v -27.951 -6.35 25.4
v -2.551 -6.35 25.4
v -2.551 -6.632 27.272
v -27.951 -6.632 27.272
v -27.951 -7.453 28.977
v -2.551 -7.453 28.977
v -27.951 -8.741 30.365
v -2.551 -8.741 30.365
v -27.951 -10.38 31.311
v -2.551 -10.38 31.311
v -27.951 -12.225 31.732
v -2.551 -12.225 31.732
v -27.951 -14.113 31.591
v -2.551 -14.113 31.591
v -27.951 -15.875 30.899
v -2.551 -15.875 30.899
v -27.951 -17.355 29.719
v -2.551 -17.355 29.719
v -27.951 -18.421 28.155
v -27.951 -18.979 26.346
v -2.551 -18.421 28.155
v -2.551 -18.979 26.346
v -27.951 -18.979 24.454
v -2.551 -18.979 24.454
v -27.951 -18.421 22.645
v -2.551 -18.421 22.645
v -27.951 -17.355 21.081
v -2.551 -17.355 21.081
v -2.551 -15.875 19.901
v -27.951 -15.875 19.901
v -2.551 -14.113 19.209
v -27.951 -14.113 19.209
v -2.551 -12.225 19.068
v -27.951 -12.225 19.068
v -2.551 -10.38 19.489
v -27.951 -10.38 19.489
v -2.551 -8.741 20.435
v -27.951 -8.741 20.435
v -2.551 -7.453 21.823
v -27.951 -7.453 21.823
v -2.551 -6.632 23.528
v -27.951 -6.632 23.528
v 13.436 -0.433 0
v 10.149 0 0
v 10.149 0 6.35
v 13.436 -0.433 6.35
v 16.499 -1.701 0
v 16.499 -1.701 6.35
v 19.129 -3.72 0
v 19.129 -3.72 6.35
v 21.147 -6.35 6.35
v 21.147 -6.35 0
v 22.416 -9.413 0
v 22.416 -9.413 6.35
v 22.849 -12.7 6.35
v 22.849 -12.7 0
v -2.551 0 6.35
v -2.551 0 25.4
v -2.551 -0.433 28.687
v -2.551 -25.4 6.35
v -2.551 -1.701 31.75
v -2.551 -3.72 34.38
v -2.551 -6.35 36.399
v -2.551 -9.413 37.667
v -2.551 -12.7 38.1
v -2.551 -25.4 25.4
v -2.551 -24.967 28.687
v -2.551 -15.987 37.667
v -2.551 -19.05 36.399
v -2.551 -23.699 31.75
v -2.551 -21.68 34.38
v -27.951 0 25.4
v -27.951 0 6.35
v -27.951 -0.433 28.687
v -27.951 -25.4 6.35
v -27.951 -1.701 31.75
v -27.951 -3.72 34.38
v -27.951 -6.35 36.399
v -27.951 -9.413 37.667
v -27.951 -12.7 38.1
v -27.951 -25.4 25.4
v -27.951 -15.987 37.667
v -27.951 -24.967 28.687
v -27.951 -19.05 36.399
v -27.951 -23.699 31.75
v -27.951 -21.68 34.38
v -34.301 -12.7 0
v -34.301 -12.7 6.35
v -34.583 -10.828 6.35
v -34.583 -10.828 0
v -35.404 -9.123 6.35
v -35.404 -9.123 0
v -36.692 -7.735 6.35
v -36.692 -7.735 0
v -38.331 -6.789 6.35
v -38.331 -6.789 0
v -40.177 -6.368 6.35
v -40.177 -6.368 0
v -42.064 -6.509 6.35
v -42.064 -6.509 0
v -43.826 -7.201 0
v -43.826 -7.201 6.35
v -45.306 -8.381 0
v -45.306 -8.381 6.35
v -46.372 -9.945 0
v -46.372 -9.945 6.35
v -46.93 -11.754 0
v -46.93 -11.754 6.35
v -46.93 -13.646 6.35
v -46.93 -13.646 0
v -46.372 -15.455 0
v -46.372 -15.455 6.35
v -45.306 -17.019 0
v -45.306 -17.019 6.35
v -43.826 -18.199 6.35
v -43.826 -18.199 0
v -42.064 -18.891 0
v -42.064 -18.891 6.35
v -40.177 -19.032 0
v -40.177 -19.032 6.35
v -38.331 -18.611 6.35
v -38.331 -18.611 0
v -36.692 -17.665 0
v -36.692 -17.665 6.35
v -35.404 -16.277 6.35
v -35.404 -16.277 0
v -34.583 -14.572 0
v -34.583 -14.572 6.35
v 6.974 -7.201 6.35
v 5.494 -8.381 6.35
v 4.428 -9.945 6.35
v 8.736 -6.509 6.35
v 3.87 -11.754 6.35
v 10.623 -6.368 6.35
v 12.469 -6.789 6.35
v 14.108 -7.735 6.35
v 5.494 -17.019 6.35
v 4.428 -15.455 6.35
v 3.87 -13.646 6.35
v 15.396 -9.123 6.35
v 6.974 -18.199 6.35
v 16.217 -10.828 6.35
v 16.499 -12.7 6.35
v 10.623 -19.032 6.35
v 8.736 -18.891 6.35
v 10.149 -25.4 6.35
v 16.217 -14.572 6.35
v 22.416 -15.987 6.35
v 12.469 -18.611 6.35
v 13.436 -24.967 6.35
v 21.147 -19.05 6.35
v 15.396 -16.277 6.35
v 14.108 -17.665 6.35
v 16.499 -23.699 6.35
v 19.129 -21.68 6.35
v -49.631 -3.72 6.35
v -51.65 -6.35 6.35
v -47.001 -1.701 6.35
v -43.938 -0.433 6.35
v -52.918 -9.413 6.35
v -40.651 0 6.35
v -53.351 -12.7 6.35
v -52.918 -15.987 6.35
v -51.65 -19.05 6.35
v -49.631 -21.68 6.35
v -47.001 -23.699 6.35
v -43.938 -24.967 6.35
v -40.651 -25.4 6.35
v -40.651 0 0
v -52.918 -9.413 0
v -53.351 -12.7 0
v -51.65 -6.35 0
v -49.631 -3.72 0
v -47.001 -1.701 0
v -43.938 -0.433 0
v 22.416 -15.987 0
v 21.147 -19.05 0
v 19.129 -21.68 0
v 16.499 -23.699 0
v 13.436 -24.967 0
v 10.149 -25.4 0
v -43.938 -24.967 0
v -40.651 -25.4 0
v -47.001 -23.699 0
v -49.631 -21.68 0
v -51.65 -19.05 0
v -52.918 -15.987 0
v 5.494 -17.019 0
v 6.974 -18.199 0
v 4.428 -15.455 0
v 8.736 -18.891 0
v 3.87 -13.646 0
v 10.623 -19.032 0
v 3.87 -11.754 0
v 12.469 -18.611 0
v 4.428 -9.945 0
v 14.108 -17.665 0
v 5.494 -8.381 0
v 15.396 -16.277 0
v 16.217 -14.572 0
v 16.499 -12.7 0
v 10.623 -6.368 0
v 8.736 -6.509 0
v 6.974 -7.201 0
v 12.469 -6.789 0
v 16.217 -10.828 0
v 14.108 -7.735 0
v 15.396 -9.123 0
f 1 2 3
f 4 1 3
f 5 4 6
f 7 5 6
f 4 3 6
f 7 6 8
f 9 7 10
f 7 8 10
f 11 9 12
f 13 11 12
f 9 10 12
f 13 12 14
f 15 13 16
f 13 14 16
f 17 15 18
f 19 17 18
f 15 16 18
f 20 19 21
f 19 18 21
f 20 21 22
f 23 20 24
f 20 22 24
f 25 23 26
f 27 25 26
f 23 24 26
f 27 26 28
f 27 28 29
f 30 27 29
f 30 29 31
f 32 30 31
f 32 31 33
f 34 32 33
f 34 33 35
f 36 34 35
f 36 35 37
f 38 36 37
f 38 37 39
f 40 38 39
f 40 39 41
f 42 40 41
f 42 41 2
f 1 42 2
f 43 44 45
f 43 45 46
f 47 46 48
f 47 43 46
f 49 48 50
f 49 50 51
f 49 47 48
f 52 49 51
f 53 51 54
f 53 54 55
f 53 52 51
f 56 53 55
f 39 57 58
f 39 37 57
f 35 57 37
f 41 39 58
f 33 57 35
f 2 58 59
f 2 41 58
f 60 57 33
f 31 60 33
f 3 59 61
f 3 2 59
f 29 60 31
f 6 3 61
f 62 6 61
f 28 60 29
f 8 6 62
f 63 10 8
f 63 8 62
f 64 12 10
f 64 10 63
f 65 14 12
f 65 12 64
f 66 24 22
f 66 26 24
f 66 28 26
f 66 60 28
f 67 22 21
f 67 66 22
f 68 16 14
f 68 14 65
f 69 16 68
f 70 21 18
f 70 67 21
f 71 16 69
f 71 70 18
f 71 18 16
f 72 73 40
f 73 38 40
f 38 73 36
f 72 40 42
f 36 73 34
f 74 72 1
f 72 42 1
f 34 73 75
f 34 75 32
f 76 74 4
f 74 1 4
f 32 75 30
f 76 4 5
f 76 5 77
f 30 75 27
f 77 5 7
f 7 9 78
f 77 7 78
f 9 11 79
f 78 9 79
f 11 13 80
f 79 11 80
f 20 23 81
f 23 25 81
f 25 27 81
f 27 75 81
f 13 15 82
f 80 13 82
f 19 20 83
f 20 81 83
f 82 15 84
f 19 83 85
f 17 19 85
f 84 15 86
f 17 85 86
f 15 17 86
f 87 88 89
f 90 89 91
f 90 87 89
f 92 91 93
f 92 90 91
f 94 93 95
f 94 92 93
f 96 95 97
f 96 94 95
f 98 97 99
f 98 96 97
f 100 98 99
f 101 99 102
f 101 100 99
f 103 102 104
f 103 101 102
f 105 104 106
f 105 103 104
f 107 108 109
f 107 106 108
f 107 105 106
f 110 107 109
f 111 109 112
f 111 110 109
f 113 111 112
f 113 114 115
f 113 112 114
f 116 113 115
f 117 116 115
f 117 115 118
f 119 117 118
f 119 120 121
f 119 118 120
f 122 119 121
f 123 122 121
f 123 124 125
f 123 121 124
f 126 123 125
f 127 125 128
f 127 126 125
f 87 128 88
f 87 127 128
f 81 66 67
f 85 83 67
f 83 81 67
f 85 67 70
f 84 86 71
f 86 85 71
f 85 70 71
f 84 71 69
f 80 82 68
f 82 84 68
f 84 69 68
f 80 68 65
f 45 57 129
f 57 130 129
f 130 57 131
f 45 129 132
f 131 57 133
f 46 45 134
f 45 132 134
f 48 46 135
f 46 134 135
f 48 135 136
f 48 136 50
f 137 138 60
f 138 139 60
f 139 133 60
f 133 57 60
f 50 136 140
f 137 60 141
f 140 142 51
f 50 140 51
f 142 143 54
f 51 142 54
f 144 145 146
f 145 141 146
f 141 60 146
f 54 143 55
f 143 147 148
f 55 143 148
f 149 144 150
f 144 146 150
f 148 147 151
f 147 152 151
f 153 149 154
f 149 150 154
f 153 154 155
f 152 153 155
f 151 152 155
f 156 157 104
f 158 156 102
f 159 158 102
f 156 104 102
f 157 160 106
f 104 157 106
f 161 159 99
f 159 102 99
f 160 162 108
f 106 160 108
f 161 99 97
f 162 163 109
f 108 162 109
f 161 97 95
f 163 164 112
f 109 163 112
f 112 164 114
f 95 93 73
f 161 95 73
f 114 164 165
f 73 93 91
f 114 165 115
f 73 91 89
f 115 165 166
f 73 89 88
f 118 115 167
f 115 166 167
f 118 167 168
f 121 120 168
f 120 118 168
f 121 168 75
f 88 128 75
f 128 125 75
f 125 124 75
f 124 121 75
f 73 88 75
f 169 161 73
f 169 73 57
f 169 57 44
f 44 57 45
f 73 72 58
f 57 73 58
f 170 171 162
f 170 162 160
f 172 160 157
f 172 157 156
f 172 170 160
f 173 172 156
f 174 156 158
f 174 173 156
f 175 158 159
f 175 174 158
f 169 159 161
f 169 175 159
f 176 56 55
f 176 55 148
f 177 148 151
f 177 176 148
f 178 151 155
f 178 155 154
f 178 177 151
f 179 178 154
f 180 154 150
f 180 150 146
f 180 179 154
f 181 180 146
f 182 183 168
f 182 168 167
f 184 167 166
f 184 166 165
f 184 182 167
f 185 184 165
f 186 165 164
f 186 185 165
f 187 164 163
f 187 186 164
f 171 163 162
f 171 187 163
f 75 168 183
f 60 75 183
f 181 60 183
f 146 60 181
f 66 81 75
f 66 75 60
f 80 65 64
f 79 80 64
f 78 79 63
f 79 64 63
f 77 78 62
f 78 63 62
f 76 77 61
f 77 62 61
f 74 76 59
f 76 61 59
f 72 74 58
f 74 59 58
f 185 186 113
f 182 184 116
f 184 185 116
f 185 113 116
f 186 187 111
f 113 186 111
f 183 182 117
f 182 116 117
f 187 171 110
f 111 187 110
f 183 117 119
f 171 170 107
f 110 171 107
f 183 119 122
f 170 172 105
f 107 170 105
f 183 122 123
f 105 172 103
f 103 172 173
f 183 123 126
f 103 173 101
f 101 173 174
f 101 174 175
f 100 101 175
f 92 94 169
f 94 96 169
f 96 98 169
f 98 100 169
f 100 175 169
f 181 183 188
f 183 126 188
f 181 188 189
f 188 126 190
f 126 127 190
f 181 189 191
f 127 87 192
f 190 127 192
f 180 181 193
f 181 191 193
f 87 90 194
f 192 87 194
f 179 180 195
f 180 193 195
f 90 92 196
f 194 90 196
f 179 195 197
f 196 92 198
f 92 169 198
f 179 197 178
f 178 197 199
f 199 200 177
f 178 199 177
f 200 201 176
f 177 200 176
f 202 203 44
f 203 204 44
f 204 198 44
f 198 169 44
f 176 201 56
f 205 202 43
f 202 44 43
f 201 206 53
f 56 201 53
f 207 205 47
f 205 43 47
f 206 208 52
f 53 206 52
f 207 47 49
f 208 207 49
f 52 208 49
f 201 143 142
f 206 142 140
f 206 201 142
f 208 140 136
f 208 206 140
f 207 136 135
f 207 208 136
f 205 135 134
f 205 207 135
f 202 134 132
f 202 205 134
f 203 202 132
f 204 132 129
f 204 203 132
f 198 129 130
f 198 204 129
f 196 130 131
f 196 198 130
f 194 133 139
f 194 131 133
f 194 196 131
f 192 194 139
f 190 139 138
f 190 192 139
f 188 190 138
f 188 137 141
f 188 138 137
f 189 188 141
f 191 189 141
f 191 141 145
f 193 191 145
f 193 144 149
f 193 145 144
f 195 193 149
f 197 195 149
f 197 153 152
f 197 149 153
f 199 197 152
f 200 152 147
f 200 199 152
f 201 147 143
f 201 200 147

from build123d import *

# Parameters (mm, degrees)
F0_W     = 76.2
F0_H     = 38.1
F1_DEPTH = 25.4
F2_W     = 25.4
F2_H     = 31.75
F3_DEPTH = 31.75
F4_R     = 6.35
F5_DEPTH = 25.4
F6_R     = 6.35
F7_DEPTH = 31.75


with BuildPart() as f1:
    # F0 (on Front) → F1 (new body)
    with BuildSketch(Plane.XZ):
        with Locations((-15.251094, 19.05)):
            Rectangle(F0_W, F0_H)
    extrude(amount=F1_DEPTH)

    # F2 (on face) → F3 (cut)
    with BuildSketch(Plane.XZ.offset(25.4)):
        with Locations((-40.651094, 22.225)):
            Rectangle(F2_W, F2_H)
        with Locations((10.148906, 22.225)):
            Rectangle(F2_W, F2_H)
    extrude(amount=-F3_DEPTH, mode=Mode.SUBTRACT)

    # F4 (on Top) → F5 (cut)
    with BuildSketch(Plane.XY):
        with Locations((10.148906, -12.7)):
            Circle(F4_R)
        with Locations((-40.651094, -12.7)):
            Circle(F4_R)
        with BuildLine():
            ThreePointArc((-40.651094, -25.4), (-49.63135, -21.680256), (-53.351094, -12.7))
            Line((-53.351094, -12.7), (-53.351094, -25.535107))
            Line((-53.351094, -25.535107), (-40.651094, -25.4))
        make_face()
        with BuildLine():
            ThreePointArc((-53.351094, -12.7), (-49.63135, -3.719744), (-40.651094, 0))
            Line((-40.651094, 0), (-53.351094, 0))
            Line((-53.351094, 0), (-53.351094, -12.7))
        make_face()
        with BuildLine():
            Line((22.848906, -25.4), (22.848906, -12.7))
            ThreePointArc((22.848906, -12.7), (19.129162, -21.680256), (10.148906, -25.4))
            Line((10.148906, -25.4), (22.848906, -25.4))
        make_face()
        with BuildLine():
            ThreePointArc((10.148906, 0), (19.129162, -3.719744), (22.848906, -12.7))
            Line((22.848906, -12.7), (22.848906, 0))
            Line((22.848906, 0), (10.148906, 0))
        make_face()
    extrude(amount=F5_DEPTH, mode=Mode.SUBTRACT)

    # F6 (on face) → F7 (cut)
    with BuildSketch(Plane.YZ.offset(-2.551094)):
        with Locations((-12.7, 25.4)):
            Circle(F6_R)
        with BuildLine():
            Line((0, 38.1), (-12.7, 38.1))
            ThreePointArc((-12.7, 38.1), (-3.719744, 34.380256), (0, 25.4))
            Line((0, 25.4), (0, 38.1))
        make_face()
        with BuildLine():
            ThreePointArc((-25.4, 25.4), (-21.680256, 34.380256), (-12.7, 38.1))
            Line((-12.7, 38.1), (-25.4, 38.1))
            Line((-25.4, 38.1), (-25.4, 25.4))
        make_face()
    extrude(amount=-F7_DEPTH, mode=Mode.SUBTRACT)


solid = f1.part
